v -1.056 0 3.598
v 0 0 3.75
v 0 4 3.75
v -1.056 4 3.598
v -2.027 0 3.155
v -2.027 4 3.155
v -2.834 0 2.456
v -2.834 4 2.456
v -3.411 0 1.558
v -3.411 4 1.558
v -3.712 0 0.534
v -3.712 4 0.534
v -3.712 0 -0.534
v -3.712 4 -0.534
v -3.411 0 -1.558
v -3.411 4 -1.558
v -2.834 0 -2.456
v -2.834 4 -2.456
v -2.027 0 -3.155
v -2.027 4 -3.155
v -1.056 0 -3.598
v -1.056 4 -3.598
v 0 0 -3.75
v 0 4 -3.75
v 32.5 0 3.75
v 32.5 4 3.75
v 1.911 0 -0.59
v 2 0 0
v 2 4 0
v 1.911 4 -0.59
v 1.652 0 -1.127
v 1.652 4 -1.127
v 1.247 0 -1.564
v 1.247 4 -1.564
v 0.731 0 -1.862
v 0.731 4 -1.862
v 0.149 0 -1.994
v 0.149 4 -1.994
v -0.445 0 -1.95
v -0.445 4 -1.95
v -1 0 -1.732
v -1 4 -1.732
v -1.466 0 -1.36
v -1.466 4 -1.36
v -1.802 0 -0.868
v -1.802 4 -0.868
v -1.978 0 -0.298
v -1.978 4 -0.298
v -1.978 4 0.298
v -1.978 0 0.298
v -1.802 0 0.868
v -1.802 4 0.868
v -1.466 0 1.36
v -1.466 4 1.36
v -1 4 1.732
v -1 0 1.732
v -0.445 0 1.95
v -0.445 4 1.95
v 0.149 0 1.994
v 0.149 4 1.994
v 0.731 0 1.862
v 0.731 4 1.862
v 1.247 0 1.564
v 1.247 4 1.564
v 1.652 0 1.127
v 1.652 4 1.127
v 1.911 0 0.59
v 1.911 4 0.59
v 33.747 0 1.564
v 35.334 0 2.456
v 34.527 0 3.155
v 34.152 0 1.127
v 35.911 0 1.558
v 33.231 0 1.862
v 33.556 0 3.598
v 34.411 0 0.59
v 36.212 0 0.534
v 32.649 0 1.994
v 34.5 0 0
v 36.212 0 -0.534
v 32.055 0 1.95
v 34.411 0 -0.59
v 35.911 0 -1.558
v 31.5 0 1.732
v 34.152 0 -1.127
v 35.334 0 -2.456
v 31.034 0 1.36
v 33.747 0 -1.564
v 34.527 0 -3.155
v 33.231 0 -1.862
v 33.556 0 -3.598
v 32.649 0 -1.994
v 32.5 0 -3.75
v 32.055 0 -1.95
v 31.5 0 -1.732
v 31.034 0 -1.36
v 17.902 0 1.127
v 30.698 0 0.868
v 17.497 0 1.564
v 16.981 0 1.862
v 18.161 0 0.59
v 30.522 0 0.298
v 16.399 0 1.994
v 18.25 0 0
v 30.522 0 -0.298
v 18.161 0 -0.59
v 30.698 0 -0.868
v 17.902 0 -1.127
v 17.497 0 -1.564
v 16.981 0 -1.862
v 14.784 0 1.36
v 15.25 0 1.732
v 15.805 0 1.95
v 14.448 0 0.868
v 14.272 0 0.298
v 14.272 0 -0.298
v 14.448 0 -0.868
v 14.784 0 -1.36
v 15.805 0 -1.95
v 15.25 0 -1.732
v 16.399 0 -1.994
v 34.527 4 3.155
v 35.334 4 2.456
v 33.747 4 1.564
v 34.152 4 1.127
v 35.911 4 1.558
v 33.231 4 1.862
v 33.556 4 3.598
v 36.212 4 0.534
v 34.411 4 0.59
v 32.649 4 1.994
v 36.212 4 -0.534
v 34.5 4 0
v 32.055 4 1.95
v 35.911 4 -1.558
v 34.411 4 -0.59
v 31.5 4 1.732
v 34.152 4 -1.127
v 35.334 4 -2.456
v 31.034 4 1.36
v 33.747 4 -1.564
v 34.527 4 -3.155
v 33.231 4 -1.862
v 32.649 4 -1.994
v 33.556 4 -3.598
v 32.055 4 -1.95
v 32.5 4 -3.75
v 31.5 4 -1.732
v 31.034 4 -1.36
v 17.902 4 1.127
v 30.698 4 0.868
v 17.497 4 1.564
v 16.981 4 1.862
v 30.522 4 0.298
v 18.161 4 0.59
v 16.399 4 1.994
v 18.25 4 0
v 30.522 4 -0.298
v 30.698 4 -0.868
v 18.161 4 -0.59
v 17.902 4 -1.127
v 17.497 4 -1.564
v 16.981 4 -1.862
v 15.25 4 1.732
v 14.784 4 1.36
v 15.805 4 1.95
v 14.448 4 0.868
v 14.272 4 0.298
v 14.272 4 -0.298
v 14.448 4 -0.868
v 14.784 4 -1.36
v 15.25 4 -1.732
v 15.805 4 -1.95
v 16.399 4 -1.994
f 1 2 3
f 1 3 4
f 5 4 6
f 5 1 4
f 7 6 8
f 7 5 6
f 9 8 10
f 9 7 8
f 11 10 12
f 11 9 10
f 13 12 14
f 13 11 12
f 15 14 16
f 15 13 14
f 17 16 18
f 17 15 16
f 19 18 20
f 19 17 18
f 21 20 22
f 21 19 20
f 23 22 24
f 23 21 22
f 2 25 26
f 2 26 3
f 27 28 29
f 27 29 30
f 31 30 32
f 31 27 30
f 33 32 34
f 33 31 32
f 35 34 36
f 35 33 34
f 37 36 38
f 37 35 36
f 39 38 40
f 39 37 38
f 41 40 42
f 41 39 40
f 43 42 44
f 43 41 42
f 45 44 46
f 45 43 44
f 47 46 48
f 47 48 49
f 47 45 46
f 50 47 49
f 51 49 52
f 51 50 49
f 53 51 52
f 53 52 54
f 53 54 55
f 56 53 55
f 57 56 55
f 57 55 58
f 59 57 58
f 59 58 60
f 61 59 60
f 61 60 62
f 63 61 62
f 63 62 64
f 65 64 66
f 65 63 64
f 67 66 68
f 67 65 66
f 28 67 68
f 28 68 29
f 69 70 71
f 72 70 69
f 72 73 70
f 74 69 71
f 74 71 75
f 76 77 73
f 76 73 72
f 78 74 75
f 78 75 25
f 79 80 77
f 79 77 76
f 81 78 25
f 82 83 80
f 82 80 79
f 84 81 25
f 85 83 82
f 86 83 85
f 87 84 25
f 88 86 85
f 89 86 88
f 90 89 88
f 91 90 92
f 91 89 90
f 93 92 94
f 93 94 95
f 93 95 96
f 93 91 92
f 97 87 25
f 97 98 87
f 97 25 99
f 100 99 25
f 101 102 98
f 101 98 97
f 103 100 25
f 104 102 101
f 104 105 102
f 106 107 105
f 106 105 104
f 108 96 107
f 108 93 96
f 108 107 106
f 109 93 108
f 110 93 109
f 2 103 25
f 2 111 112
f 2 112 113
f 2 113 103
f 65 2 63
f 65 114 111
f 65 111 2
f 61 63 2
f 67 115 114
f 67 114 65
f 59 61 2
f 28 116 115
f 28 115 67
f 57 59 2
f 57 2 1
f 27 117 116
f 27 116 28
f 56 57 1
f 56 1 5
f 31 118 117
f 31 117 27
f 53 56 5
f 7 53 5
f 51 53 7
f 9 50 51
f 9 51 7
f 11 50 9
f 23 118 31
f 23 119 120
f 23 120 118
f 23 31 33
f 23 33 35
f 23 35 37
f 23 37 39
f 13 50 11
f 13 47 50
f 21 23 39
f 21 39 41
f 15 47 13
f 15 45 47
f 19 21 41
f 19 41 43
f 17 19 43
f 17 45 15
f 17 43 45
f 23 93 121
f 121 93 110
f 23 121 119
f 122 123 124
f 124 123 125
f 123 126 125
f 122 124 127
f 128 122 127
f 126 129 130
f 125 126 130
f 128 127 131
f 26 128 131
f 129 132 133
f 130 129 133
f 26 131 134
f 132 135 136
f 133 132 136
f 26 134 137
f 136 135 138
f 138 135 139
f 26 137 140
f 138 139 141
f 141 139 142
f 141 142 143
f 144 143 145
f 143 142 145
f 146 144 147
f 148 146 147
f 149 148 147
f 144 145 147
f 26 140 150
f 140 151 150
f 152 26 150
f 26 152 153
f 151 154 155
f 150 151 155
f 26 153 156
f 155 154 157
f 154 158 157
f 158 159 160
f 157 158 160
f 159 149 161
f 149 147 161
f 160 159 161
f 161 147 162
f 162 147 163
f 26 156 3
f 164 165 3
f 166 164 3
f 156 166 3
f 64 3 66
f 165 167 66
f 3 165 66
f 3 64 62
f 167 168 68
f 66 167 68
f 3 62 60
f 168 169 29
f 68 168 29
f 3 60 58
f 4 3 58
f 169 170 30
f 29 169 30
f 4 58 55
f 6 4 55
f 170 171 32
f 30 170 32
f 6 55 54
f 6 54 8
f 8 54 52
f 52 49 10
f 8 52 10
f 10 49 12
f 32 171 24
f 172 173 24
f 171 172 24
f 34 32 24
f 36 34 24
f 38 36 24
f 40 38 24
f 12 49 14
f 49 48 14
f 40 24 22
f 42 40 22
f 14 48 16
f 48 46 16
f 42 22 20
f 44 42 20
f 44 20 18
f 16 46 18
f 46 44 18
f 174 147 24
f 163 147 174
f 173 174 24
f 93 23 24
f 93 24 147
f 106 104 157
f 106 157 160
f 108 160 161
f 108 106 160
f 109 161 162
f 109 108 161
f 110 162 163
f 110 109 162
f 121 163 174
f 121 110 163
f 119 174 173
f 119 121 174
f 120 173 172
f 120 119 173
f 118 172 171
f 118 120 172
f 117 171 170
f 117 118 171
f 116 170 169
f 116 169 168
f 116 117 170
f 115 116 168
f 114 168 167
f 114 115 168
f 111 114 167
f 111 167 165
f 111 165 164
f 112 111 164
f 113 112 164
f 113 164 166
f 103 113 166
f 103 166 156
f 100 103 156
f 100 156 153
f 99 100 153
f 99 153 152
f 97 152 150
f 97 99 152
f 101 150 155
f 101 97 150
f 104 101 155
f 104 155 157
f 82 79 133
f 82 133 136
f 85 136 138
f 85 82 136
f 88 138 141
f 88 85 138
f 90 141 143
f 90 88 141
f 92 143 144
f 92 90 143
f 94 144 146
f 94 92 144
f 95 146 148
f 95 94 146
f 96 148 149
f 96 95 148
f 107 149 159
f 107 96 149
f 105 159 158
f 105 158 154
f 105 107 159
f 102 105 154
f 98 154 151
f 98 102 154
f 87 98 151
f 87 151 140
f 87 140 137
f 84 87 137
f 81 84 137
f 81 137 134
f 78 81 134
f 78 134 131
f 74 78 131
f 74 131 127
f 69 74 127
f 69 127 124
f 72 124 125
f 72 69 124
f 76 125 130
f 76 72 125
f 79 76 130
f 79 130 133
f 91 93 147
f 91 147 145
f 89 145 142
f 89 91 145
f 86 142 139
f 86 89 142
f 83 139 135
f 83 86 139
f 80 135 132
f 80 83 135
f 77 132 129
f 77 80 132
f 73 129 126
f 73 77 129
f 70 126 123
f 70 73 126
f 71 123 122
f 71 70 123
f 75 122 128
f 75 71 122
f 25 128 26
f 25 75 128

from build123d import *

# Parameters (mm, degrees)
SKETCH1_R           = 2
BOSS_EXTRUDE1_DEPTH = 4


with BuildPart() as part:
    # Sketch1 → Boss-Extrude1 (new body)
    with BuildSketch(Plane(origin=(0, 0, 0), x_dir=(1, 0, 0), z_dir=(0, 1, 0))):
        with BuildLine():
            Line((0, 3.75), (32.5, 3.75))
            ThreePointArc((32.5, 3.75), (36.25, 0), (32.5, -3.75))
            Line((32.5, -3.75), (0, -3.75))
            ThreePointArc((0, -3.75), (-3.75, 0), (0, 3.75))
        make_face()
        Circle(SKETCH1_R, mode=Mode.SUBTRACT)
        with Locations((16.25, 0)):
            Circle(SKETCH1_R, mode=Mode.SUBTRACT)
        with Locations((32.5, 0)):
            Circle(SKETCH1_R, mode=Mode.SUBTRACT)
    extrude(amount=BOSS_EXTRUDE1_DEPTH)


solid = part.part
